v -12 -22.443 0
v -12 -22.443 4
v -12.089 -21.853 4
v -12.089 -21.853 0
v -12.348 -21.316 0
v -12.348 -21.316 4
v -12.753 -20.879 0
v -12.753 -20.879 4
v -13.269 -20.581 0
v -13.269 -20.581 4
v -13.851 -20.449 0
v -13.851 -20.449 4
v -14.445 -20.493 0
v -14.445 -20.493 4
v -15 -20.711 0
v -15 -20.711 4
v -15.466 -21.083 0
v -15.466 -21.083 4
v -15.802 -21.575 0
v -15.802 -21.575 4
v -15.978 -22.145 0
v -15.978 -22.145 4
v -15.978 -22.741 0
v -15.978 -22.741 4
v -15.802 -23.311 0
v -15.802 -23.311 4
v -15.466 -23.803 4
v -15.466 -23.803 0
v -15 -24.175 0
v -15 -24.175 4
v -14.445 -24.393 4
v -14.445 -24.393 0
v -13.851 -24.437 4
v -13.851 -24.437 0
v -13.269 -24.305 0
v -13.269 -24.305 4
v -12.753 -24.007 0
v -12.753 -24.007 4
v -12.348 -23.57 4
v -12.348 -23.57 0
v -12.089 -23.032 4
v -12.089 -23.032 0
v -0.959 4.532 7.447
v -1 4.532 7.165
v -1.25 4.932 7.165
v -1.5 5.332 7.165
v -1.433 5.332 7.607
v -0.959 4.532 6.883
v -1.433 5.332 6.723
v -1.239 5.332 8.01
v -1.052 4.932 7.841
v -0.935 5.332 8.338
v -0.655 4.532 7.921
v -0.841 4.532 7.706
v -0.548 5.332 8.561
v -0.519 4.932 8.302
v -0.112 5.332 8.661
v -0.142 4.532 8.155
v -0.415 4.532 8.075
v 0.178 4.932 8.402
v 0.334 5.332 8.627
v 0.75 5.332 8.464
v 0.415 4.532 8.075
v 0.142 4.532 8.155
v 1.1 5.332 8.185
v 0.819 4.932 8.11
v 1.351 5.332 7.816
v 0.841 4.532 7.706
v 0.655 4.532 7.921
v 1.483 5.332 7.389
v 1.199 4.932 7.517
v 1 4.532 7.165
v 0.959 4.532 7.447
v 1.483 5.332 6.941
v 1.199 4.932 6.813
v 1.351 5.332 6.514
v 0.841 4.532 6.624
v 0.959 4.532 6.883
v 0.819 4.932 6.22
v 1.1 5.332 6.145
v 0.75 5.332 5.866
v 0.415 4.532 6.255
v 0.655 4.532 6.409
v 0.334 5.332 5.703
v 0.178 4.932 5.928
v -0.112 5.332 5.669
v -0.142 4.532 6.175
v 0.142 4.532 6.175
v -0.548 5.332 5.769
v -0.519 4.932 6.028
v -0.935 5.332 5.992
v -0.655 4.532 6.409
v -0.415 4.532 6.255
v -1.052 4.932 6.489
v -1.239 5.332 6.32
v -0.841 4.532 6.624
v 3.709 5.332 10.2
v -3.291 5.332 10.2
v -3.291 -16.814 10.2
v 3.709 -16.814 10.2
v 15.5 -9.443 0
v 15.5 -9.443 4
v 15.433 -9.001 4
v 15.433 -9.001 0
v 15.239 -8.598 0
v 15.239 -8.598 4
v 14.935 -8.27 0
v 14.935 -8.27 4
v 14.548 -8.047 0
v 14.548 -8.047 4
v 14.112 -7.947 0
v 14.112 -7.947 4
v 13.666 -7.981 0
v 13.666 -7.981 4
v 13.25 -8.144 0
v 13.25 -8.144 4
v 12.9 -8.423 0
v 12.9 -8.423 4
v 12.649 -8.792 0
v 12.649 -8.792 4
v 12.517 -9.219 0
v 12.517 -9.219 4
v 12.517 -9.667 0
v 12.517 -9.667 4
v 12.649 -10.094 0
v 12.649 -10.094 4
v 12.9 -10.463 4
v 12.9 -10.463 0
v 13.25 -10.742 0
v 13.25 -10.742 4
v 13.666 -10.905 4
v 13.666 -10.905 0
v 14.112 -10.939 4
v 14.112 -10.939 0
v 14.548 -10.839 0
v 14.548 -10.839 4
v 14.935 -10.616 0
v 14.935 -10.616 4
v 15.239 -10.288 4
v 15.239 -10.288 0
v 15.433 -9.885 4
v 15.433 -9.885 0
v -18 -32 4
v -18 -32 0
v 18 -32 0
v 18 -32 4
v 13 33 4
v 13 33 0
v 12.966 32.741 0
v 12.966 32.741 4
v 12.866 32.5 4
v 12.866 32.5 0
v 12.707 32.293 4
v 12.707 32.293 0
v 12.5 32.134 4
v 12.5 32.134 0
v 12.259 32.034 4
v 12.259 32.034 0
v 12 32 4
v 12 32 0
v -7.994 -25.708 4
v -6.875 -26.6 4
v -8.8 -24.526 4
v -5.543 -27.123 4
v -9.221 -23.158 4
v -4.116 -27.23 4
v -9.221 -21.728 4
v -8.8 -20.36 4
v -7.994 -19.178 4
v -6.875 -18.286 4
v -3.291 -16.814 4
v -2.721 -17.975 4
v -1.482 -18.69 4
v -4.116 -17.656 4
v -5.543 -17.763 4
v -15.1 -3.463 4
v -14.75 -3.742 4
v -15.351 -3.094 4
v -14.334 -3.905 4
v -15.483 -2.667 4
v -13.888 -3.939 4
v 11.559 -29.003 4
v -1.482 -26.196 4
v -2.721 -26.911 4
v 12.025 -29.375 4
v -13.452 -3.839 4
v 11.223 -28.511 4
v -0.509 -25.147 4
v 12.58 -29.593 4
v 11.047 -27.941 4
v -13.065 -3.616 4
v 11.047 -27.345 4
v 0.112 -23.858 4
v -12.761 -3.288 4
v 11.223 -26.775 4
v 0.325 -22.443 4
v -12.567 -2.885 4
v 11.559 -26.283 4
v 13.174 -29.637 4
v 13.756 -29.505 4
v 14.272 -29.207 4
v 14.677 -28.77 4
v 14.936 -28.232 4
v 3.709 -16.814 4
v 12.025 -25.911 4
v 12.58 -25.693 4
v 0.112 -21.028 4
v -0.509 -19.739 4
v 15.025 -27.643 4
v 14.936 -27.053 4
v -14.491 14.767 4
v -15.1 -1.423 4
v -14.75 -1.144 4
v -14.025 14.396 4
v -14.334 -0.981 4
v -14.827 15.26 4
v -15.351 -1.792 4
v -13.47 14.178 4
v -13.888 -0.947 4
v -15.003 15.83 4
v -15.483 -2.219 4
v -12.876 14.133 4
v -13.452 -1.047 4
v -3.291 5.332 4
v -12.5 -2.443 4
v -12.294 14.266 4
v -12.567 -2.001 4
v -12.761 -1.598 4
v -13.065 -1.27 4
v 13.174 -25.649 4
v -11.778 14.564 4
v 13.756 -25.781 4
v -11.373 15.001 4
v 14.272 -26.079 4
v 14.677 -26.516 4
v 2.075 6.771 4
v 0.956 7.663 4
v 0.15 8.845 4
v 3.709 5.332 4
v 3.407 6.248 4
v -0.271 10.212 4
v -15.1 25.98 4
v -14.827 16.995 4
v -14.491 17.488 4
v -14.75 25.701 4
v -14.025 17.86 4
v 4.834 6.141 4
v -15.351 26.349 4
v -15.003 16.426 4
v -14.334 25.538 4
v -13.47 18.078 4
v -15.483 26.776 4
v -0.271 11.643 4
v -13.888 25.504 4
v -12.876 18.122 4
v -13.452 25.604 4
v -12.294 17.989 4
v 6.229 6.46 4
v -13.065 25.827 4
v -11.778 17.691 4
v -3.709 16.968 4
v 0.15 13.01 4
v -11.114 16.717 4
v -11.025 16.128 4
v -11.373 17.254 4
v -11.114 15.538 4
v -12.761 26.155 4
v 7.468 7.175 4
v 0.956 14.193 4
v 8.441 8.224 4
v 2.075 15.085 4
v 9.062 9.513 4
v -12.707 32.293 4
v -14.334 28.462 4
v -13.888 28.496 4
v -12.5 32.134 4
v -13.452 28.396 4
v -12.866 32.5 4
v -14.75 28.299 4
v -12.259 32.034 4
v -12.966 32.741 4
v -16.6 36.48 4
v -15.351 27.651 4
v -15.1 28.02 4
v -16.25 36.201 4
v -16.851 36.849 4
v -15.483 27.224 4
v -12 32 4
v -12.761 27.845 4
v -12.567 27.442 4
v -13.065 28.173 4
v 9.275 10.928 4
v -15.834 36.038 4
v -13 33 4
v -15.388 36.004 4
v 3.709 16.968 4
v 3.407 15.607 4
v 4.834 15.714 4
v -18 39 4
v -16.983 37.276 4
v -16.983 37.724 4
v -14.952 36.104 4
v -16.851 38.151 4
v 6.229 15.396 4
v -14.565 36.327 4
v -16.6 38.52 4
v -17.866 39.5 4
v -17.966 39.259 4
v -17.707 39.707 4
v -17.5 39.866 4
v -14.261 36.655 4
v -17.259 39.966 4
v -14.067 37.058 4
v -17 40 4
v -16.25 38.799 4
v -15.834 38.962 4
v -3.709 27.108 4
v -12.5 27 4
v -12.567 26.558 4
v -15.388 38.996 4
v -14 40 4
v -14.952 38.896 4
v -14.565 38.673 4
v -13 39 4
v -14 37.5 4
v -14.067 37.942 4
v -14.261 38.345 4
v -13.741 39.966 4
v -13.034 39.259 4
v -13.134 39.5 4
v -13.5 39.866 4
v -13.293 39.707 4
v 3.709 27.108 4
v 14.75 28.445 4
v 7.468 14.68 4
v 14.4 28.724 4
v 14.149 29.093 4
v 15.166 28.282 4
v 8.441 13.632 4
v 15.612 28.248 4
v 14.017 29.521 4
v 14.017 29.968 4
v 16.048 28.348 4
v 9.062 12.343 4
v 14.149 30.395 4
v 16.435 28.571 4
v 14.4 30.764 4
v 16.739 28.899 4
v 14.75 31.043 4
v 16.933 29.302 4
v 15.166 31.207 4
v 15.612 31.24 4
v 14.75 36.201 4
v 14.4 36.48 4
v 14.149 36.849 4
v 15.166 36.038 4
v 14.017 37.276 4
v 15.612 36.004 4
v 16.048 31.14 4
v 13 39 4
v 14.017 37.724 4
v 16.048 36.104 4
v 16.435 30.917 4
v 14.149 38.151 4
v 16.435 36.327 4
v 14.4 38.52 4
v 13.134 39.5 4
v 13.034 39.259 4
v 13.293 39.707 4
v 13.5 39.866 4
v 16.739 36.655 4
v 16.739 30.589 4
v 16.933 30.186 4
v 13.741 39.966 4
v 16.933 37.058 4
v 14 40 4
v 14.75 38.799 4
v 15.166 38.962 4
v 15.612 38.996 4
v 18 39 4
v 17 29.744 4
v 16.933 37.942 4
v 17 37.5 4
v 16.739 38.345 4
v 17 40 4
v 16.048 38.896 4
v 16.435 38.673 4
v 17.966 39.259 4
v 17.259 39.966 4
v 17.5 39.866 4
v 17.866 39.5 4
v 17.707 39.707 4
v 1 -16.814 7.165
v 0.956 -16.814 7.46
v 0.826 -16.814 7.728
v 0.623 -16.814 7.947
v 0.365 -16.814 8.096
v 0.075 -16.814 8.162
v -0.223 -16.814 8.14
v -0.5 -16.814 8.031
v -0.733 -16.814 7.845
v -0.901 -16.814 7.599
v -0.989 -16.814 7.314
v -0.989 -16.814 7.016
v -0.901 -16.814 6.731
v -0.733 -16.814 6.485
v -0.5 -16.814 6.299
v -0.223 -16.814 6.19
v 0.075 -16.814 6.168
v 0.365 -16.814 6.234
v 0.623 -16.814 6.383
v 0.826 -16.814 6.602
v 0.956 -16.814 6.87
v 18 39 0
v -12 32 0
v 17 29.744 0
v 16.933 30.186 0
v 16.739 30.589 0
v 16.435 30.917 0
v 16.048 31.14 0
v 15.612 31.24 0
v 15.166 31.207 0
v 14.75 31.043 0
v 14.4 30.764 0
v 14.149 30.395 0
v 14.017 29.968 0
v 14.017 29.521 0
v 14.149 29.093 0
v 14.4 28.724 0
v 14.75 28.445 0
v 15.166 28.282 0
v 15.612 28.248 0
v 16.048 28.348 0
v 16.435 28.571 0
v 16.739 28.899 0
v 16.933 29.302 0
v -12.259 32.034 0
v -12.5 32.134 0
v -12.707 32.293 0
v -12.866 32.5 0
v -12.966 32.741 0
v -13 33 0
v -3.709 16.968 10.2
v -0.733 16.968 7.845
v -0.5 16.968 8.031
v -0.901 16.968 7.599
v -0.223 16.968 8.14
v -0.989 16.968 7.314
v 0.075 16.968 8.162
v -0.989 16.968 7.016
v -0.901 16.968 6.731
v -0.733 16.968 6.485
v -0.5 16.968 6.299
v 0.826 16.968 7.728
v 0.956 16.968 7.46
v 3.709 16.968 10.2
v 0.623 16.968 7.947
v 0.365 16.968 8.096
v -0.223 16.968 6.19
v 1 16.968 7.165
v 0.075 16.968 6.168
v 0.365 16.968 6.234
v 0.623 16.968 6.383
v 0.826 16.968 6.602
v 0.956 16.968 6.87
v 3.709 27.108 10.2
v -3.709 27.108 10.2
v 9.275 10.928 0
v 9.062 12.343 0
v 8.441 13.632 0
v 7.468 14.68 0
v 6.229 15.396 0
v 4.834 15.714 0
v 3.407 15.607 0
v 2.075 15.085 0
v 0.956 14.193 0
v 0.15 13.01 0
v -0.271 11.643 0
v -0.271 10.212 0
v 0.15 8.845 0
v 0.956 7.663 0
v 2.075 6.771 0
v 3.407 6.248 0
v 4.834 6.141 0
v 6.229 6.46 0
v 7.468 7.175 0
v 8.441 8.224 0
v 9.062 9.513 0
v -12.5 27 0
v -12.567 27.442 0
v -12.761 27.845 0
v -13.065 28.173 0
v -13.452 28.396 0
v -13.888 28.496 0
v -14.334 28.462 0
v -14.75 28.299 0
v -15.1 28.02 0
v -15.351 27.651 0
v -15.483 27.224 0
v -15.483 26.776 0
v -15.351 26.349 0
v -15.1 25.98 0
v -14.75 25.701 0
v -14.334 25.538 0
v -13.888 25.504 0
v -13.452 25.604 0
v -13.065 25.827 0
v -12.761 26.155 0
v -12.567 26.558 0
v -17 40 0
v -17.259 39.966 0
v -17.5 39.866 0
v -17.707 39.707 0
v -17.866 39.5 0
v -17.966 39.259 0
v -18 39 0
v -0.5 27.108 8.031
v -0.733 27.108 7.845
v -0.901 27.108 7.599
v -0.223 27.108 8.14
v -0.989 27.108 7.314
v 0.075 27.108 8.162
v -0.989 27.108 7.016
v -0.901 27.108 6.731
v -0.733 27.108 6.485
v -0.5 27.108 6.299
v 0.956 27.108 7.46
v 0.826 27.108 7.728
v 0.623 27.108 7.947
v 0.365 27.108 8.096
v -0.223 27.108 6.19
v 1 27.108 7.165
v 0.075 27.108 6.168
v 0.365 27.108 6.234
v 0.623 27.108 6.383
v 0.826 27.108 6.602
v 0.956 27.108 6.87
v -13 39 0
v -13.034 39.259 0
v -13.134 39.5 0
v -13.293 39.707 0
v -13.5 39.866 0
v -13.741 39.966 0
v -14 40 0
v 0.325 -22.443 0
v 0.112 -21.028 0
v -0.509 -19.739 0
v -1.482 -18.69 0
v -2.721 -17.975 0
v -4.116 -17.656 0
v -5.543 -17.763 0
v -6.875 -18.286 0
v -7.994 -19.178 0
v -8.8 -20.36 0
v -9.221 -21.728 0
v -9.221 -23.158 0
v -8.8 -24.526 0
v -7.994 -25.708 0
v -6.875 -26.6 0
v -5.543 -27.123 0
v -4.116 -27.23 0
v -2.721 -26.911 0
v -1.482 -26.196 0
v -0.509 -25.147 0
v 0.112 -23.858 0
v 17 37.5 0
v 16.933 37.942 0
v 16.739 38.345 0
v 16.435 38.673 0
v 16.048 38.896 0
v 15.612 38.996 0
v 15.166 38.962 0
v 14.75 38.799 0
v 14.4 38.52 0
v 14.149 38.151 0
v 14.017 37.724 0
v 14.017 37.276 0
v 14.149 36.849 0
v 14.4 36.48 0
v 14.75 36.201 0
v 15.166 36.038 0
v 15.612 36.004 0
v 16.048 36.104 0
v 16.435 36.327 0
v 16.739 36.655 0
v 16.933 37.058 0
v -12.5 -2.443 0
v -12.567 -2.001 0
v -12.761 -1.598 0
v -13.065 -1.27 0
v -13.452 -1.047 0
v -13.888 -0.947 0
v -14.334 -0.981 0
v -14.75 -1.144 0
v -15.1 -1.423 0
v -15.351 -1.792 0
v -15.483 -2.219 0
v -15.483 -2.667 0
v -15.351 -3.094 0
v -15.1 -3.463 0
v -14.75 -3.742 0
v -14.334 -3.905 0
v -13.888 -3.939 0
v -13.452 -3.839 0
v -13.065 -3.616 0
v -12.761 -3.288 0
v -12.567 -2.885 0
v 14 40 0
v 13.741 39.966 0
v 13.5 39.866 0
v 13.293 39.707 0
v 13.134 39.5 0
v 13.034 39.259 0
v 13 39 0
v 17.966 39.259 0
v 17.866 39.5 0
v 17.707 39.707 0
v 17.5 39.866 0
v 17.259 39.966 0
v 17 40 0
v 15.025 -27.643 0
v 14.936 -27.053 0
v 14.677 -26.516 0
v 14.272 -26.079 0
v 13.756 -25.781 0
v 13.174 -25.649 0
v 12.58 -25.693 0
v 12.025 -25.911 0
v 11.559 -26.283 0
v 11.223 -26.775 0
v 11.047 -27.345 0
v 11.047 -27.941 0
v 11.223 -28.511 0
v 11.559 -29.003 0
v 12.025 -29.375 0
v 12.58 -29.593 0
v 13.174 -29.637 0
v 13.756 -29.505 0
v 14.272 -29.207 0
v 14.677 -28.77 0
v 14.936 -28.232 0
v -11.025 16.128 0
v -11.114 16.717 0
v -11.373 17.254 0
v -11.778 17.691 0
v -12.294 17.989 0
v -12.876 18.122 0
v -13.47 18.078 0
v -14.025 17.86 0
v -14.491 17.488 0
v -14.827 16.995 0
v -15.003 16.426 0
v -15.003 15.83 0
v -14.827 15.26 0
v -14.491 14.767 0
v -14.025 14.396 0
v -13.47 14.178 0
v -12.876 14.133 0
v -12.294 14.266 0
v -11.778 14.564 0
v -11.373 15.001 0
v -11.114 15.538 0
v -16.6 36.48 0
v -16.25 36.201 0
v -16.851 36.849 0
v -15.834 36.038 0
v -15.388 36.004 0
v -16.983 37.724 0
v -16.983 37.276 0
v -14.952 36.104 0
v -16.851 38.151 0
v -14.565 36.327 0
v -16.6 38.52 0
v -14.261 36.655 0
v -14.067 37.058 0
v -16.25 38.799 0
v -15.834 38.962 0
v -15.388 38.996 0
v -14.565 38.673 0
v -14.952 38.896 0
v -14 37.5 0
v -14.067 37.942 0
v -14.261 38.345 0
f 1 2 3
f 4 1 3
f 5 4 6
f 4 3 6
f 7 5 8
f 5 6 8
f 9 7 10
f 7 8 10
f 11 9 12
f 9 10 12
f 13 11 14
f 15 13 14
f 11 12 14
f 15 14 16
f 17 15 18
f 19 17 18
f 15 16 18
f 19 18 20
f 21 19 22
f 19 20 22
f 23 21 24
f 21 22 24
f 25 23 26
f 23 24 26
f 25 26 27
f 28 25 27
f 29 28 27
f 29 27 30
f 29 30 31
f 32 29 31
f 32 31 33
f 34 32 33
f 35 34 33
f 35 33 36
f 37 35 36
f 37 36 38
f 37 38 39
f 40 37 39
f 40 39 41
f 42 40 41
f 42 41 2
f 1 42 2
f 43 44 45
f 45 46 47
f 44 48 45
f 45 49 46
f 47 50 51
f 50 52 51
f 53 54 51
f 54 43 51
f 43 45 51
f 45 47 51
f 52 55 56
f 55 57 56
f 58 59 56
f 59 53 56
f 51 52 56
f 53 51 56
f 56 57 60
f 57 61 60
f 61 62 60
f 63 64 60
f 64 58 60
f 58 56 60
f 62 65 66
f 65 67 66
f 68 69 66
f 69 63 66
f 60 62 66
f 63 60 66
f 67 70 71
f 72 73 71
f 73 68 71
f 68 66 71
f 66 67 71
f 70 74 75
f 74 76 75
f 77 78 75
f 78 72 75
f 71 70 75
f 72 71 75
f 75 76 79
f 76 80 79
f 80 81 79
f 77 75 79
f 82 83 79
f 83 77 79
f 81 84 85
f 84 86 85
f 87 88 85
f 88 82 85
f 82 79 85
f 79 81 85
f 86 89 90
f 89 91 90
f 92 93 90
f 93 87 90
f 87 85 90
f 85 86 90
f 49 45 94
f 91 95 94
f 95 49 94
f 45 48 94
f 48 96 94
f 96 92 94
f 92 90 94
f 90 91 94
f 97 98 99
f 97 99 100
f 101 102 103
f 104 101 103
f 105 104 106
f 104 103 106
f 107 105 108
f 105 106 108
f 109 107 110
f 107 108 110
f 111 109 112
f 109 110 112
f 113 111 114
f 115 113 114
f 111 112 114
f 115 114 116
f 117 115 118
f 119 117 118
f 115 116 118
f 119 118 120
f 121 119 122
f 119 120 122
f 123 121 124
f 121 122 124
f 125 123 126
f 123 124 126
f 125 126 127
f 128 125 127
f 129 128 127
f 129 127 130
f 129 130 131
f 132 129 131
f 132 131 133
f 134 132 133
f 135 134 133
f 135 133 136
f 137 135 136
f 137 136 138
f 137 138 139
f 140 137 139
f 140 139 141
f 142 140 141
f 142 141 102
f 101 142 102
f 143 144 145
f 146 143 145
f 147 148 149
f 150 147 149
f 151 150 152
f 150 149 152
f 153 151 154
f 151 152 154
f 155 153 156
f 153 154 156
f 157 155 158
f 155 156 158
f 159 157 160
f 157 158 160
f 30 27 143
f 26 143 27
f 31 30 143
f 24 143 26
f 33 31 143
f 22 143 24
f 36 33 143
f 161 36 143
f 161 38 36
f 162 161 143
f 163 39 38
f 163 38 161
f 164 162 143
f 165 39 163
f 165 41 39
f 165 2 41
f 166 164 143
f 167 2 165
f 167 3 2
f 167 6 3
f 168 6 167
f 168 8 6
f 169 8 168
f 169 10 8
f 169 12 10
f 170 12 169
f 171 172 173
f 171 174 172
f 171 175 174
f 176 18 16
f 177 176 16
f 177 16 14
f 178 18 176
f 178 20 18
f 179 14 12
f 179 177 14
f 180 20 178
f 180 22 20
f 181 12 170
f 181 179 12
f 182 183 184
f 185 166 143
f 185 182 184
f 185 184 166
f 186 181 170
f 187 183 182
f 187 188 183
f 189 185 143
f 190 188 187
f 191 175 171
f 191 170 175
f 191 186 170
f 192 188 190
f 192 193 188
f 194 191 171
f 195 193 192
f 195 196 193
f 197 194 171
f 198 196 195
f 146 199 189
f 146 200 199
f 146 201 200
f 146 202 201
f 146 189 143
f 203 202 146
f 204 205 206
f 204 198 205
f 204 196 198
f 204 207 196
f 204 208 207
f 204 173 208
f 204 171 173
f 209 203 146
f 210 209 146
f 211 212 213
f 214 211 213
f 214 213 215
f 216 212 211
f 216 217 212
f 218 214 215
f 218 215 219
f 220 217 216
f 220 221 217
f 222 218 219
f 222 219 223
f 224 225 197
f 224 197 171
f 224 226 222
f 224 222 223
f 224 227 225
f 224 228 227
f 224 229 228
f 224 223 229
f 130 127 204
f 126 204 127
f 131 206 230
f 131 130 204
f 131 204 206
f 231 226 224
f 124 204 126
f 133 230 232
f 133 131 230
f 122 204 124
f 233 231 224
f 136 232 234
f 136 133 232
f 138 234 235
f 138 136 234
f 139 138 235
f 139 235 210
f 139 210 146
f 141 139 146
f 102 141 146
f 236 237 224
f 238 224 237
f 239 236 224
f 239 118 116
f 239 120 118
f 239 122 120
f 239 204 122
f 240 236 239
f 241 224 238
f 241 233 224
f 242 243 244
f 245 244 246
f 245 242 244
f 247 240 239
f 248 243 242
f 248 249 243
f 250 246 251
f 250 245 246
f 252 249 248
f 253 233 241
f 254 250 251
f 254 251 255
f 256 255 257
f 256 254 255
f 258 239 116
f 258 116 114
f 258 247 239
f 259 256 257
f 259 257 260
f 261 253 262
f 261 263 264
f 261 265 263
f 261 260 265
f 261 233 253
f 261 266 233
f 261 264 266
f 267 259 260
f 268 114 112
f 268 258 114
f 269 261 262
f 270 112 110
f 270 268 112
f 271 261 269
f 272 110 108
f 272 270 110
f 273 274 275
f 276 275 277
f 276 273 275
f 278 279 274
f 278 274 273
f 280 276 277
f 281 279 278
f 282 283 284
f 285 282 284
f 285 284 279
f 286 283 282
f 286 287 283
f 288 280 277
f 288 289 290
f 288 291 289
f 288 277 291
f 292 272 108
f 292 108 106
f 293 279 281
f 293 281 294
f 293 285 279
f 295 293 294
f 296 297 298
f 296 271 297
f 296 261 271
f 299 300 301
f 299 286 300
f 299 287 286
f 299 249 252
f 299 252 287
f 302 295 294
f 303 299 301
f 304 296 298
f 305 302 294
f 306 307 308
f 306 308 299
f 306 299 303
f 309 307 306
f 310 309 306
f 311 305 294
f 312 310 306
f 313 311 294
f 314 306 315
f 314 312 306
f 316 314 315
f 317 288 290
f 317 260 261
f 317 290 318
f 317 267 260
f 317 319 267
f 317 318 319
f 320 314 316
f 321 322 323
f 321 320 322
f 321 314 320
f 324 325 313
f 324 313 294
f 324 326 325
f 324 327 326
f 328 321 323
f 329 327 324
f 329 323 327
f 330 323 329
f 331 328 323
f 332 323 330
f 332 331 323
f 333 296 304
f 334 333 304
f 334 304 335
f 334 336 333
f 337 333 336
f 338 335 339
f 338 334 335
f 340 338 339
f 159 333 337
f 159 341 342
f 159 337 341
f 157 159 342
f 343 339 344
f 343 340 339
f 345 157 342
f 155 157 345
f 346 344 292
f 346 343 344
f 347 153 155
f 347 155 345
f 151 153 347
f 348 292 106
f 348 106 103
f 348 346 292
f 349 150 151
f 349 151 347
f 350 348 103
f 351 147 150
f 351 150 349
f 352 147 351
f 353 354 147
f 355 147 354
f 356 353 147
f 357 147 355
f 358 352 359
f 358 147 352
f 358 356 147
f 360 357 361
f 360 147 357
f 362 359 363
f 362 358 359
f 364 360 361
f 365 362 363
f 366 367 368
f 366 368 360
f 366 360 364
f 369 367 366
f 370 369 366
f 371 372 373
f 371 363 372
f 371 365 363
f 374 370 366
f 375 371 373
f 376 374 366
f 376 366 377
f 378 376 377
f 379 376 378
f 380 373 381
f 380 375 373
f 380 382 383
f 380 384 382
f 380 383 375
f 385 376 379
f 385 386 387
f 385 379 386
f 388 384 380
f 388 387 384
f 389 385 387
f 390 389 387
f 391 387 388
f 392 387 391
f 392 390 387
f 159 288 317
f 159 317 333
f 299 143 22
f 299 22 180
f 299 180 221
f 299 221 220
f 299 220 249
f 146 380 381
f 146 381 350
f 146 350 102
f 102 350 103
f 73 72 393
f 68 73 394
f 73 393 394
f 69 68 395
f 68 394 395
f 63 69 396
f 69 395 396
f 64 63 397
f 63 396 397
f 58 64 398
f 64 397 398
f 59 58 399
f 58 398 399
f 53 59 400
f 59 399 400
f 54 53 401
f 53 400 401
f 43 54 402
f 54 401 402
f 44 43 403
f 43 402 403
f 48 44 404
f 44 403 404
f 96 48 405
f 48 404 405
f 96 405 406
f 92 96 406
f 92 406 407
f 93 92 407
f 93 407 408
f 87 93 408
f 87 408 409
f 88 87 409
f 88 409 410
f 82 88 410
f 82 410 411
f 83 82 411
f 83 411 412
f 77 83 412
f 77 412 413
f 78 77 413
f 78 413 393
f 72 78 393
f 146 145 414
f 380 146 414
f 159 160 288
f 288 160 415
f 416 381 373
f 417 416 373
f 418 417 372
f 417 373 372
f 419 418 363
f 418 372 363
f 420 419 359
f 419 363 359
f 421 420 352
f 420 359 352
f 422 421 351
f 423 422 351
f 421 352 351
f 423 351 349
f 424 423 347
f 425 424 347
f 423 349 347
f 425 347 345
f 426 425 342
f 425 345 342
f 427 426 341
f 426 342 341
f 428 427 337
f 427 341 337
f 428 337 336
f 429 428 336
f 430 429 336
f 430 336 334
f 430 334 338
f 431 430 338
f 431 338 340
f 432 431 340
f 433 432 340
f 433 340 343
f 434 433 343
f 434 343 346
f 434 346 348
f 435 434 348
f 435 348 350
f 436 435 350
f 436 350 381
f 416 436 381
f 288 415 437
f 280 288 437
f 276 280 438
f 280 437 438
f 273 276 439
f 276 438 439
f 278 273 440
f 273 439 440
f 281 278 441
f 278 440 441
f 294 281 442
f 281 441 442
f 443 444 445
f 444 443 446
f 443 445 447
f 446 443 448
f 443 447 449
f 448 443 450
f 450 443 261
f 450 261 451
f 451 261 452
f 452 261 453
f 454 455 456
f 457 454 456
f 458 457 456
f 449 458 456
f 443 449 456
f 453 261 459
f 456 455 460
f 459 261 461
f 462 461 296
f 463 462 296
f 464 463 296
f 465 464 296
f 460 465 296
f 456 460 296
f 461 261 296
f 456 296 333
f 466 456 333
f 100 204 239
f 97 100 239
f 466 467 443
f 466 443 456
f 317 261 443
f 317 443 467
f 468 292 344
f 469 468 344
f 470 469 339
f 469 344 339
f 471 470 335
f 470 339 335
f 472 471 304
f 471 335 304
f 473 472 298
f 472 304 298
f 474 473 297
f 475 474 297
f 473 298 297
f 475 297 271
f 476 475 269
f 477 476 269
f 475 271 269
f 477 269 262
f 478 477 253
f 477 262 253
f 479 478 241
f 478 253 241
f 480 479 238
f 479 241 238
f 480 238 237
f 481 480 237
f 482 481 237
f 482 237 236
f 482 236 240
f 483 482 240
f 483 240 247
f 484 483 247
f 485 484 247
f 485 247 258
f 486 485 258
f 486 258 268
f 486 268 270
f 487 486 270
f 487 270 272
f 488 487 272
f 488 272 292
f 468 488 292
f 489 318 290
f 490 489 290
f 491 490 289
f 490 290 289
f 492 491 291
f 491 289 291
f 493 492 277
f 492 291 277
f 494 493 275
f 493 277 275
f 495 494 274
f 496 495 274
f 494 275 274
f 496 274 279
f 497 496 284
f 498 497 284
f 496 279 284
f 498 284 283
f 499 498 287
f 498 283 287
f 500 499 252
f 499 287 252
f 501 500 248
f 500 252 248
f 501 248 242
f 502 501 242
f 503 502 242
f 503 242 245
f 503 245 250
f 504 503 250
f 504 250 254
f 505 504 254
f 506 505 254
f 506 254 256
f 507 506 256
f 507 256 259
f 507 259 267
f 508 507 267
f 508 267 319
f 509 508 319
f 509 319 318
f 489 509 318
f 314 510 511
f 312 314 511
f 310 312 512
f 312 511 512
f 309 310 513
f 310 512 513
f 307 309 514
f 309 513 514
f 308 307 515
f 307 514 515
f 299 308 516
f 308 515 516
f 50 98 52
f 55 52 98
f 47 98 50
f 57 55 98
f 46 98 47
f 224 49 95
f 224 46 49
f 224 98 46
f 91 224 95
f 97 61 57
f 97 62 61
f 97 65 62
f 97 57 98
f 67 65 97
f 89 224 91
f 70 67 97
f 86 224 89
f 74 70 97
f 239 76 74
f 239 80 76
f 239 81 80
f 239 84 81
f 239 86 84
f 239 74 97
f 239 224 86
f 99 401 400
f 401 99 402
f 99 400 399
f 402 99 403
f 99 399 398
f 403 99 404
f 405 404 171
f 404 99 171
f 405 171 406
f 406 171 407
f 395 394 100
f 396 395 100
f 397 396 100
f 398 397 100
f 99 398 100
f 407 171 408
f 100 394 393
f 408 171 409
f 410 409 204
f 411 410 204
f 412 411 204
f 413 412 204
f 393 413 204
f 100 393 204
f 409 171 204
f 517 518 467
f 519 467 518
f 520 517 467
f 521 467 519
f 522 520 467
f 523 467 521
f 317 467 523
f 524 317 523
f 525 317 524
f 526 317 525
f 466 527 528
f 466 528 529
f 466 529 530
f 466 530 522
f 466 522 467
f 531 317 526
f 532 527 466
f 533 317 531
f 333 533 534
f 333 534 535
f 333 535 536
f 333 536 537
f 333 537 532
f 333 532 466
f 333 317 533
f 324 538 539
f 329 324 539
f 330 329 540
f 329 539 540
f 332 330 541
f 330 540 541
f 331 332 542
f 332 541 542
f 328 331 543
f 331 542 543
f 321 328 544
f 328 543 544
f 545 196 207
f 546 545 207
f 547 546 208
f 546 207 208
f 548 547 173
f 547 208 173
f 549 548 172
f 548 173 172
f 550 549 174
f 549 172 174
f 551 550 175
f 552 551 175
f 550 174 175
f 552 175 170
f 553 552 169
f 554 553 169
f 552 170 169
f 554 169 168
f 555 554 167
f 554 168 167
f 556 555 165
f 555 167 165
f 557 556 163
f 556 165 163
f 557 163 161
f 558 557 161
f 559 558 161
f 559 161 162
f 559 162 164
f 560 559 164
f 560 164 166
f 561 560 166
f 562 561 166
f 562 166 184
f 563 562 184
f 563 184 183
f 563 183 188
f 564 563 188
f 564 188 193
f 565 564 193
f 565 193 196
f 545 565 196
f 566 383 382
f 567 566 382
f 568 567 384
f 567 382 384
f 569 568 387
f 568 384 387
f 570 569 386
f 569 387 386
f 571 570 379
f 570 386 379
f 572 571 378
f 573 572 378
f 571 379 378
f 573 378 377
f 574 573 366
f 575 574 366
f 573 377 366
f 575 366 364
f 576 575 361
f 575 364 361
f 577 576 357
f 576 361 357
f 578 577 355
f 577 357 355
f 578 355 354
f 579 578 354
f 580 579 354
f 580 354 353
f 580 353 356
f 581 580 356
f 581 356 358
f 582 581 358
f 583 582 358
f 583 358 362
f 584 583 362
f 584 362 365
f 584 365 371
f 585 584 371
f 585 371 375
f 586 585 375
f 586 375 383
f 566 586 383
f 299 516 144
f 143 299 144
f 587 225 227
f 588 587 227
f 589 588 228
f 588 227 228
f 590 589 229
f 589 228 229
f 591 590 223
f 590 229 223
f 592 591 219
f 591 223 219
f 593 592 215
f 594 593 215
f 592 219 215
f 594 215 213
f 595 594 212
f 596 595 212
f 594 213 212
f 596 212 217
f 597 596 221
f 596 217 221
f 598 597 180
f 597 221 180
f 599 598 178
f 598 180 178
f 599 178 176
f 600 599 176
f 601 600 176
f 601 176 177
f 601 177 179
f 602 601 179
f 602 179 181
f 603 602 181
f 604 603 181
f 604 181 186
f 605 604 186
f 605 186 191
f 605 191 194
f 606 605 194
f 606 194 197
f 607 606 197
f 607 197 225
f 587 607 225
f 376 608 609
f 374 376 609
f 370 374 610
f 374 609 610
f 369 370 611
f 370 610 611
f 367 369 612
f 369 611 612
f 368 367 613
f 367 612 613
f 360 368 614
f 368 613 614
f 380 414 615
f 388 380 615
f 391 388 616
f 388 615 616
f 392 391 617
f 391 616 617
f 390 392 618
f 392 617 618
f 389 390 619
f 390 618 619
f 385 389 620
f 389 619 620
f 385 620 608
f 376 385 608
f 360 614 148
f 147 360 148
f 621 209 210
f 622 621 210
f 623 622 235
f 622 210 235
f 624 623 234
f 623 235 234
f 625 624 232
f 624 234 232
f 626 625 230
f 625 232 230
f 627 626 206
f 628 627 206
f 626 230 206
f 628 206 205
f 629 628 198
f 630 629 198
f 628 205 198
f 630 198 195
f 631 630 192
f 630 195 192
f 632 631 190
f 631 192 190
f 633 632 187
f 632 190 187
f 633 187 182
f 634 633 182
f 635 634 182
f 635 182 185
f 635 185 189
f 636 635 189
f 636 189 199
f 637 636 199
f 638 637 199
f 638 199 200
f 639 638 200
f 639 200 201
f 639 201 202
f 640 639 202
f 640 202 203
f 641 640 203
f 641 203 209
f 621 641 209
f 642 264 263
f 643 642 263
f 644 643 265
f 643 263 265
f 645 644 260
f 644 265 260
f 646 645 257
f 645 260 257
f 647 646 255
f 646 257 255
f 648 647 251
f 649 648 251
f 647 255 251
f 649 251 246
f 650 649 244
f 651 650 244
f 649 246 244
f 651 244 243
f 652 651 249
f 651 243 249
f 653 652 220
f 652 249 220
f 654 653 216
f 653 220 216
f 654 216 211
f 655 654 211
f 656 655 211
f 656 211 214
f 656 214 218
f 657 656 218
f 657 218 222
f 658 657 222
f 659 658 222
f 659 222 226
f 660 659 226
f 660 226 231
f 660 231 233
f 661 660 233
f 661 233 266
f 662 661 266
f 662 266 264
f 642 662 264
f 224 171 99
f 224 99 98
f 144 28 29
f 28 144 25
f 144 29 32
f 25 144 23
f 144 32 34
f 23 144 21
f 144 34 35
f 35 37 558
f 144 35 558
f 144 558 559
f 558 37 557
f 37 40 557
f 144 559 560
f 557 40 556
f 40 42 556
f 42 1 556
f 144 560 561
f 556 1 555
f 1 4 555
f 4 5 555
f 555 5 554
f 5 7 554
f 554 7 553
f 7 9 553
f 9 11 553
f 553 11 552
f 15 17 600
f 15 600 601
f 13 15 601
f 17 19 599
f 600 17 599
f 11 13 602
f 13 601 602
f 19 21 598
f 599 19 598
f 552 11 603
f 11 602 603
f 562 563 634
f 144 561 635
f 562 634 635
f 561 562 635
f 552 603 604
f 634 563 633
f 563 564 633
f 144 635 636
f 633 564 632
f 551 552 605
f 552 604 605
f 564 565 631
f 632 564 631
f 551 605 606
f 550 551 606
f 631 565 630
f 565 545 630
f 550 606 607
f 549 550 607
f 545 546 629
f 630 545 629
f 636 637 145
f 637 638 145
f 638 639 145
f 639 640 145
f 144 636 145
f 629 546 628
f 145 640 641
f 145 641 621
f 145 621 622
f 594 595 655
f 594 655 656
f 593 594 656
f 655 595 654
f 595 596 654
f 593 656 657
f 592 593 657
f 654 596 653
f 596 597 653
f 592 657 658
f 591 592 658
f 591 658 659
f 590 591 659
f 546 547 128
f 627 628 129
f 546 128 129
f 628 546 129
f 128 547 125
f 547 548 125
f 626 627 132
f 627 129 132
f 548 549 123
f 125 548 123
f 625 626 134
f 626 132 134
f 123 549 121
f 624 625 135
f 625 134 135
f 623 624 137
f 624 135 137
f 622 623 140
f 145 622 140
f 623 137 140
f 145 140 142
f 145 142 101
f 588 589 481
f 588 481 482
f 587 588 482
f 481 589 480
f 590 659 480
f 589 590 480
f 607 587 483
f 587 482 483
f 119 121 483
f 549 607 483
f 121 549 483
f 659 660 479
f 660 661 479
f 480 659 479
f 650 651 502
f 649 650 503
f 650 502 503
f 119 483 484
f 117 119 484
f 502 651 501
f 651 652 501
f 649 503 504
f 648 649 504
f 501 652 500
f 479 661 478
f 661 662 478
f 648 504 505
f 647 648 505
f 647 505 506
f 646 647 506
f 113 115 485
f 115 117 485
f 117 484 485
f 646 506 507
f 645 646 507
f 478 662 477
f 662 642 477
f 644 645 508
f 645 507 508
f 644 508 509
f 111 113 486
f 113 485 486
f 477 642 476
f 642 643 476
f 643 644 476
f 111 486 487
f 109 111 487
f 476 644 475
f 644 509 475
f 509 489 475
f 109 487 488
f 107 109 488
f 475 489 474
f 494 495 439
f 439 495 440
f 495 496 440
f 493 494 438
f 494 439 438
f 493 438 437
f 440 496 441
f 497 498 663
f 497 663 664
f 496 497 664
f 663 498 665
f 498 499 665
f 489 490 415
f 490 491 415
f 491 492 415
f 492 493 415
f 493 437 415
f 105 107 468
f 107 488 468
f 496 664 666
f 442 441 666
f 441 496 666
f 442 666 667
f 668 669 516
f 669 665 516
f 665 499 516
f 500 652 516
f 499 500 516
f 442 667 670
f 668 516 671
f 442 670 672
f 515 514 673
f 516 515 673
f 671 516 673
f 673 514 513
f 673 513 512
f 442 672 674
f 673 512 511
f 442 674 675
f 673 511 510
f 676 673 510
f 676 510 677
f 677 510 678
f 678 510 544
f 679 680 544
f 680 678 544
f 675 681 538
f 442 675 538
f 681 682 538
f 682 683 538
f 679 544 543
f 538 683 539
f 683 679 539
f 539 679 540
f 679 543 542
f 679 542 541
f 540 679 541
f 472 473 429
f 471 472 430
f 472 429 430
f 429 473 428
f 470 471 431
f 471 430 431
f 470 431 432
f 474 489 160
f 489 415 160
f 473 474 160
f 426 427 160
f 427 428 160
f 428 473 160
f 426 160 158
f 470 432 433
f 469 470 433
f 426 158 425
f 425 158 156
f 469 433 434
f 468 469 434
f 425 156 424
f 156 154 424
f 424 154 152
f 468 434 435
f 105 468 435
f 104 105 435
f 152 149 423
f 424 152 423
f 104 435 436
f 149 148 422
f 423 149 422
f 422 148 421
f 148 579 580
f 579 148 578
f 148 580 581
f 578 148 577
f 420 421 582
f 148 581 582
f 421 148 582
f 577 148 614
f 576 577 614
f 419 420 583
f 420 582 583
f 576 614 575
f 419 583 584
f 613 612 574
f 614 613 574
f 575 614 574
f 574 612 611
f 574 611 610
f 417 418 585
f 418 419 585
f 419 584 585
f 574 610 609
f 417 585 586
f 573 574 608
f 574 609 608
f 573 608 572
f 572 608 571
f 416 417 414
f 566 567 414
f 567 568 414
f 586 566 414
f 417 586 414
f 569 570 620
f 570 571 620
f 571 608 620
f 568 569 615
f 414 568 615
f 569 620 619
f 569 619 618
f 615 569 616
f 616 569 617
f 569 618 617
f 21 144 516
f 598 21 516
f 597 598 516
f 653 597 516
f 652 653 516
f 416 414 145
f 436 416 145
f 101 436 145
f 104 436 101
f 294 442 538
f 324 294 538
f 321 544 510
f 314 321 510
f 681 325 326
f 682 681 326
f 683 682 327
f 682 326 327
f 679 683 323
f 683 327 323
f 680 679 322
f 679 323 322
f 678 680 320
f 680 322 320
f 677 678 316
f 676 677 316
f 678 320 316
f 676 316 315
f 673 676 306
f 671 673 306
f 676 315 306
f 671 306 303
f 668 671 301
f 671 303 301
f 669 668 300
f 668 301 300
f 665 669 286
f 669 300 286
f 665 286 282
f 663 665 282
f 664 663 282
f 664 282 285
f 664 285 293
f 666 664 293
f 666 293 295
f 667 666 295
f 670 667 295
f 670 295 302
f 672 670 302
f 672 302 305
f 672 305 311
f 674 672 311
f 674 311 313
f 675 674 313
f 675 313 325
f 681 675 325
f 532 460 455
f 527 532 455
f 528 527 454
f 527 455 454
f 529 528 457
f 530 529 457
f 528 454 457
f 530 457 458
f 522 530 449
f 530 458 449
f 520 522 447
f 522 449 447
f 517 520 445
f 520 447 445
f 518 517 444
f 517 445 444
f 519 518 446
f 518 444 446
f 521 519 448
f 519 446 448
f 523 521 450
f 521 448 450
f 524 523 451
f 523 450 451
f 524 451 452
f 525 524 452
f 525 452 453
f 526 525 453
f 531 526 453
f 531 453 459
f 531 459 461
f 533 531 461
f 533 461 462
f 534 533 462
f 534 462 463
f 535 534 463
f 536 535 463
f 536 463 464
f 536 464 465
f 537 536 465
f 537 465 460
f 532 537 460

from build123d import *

# Parameters (mm, degrees)
BOSS_EXTRUDE1_DEPTH = 4
SKETCH2_R           = 1.5
SKETCH2_R_2         = 4.8
SKETCH2_R_3         = 2
CUT_EXTRUDE1_DEPTH  = 10
SKETCH3_W           = 7
SKETCH3_H           = 22.146248503
SKETCH3_W_2         = 7.418721668
SKETCH3_H_2         = 10.140288501
BOSS_EXTRUDE2_DEPTH = 6.2
SKETCH4_R           = 1
CUT_EXTRUDE2_DEPTH  = 70
SKETCH5_R           = 1.5
CUT_EXTRUDE3_DEPTH  = 3
CUT_EXTRUDE3_DRAFT  = -32


with BuildPart() as part:
    # Sketch1 → Boss-Extrude1 (new body)
    with BuildSketch(Plane.XY):
        with BuildLine():
            Line((18, 32), (18, 39))
            ThreePointArc((18, 39), (17.707106781, 39.707106781), (17, 40))
            Line((17, 40), (14, 40))
            ThreePointArc((14, 40), (13.292893219, 39.707106781), (13, 39))
            Line((13, 39), (13, 33))
            ThreePointArc((13, 33), (12.707106781, 32.292893219), (12, 32))
            Line((12, 32), (-12, 32))
            ThreePointArc((-12, 32), (-12.707106781, 32.292893219), (-13, 33))
            Line((-13, 33), (-13, 39))
            ThreePointArc((-13, 39), (-13.292893219, 39.707106781), (-14, 40))
            Line((-14, 40), (-17, 40))
            ThreePointArc((-17, 40), (-17.707106781, 39.707106781), (-18, 39))
            Line((-18, 39), (-18, 32))
            Line((-18, 32), (-18, -32))
            Line((-18, -32), (18, -32))
            Line((18, -32), (18, 32))
        make_face()
    extrude(amount=BOSS_EXTRUDE1_DEPTH)

    # Sketch2 → Cut-Extrude1 (cut)
    with BuildSketch(Plane.XY.offset(4)):
        with Locations((15.5, 29.744145571)):
            Circle(SKETCH2_R)
        with Locations((-14, 27)):
            Circle(SKETCH2_R)
        with Locations((4.475, 10.927702889)):
            Circle(SKETCH2_R_2)
        with Locations((-14, -2.442942894)):
            Circle(SKETCH2_R)
        with Locations((14, -9.442942894)):
            Circle(SKETCH2_R)
        with Locations((-4.475, -22.442942894)):
            Circle(SKETCH2_R_2)
        with Locations((13.025, -27.642942894)):
            Circle(SKETCH2_R_3)
        with Locations((-14, -22.442942894)):
            Circle(SKETCH2_R_3)
        with Locations((-13.025, 16.127702889)):
            Circle(SKETCH2_R_3)
        with Locations((15.5, 37.5)):
            Circle(SKETCH2_R)
        with Locations((-15.5, 37.5)):
            Circle(SKETCH2_R)
    extrude(amount=-CUT_EXTRUDE1_DEPTH, mode=Mode.SUBTRACT)

    # Sketch3 → Boss-Extrude2 (add)
    with BuildSketch(Plane.XY.offset(4)):
        with Locations((0.209360834, -5.740885149)):
            Rectangle(SKETCH3_W, SKETCH3_H)
        with Locations((0, 22.037818849)):
            Rectangle(SKETCH3_W_2, SKETCH3_H_2)
    extrude(amount=BOSS_EXTRUDE2_DEPTH)

    # Sketch4 → Cut-Extrude2 (cut)
    with BuildSketch(Plane.XZ.offset(16.8140094)):
        with Locations((0, 7.165)):
            Circle(SKETCH4_R)
    extrude(amount=-CUT_EXTRUDE2_DEPTH, mode=Mode.SUBTRACT)


with BuildPart() as cut_extrude3_tool:
    # Sketch5 → Cut-Extrude3 (with draft: the straight prism first)
    with BuildSketch(Plane(origin=(0, 5.332239103, 0), x_dir=(-1, 0, 0), z_dir=(0, 1, 0))):
        with Locations((0, 7.165)):
            Circle(SKETCH5_R)
    extrude(amount=-CUT_EXTRUDE3_DEPTH)
    # Cut-Extrude3: the draft: its side faces are tilted about the plane it starts from
    cut_extrude3_sides = [cut_extrude3_tool.faces().sort_by_distance(p)[0] for p in [
        (1.5, 3.832239103, 7.165),
    ]]
    draft(cut_extrude3_sides, Plane(origin=(0, 5.332239103, 0), x_dir=(-1, 0, 0), z_dir=(0, 1, 0)), CUT_EXTRUDE3_DRAFT)


with BuildPart() as part_1:
    add(part.part)

    # Cut-Extrude3: cut by cut_extrude3_tool
    add(cut_extrude3_tool.part, mode=Mode.SUBTRACT)


solid = part_1.part
